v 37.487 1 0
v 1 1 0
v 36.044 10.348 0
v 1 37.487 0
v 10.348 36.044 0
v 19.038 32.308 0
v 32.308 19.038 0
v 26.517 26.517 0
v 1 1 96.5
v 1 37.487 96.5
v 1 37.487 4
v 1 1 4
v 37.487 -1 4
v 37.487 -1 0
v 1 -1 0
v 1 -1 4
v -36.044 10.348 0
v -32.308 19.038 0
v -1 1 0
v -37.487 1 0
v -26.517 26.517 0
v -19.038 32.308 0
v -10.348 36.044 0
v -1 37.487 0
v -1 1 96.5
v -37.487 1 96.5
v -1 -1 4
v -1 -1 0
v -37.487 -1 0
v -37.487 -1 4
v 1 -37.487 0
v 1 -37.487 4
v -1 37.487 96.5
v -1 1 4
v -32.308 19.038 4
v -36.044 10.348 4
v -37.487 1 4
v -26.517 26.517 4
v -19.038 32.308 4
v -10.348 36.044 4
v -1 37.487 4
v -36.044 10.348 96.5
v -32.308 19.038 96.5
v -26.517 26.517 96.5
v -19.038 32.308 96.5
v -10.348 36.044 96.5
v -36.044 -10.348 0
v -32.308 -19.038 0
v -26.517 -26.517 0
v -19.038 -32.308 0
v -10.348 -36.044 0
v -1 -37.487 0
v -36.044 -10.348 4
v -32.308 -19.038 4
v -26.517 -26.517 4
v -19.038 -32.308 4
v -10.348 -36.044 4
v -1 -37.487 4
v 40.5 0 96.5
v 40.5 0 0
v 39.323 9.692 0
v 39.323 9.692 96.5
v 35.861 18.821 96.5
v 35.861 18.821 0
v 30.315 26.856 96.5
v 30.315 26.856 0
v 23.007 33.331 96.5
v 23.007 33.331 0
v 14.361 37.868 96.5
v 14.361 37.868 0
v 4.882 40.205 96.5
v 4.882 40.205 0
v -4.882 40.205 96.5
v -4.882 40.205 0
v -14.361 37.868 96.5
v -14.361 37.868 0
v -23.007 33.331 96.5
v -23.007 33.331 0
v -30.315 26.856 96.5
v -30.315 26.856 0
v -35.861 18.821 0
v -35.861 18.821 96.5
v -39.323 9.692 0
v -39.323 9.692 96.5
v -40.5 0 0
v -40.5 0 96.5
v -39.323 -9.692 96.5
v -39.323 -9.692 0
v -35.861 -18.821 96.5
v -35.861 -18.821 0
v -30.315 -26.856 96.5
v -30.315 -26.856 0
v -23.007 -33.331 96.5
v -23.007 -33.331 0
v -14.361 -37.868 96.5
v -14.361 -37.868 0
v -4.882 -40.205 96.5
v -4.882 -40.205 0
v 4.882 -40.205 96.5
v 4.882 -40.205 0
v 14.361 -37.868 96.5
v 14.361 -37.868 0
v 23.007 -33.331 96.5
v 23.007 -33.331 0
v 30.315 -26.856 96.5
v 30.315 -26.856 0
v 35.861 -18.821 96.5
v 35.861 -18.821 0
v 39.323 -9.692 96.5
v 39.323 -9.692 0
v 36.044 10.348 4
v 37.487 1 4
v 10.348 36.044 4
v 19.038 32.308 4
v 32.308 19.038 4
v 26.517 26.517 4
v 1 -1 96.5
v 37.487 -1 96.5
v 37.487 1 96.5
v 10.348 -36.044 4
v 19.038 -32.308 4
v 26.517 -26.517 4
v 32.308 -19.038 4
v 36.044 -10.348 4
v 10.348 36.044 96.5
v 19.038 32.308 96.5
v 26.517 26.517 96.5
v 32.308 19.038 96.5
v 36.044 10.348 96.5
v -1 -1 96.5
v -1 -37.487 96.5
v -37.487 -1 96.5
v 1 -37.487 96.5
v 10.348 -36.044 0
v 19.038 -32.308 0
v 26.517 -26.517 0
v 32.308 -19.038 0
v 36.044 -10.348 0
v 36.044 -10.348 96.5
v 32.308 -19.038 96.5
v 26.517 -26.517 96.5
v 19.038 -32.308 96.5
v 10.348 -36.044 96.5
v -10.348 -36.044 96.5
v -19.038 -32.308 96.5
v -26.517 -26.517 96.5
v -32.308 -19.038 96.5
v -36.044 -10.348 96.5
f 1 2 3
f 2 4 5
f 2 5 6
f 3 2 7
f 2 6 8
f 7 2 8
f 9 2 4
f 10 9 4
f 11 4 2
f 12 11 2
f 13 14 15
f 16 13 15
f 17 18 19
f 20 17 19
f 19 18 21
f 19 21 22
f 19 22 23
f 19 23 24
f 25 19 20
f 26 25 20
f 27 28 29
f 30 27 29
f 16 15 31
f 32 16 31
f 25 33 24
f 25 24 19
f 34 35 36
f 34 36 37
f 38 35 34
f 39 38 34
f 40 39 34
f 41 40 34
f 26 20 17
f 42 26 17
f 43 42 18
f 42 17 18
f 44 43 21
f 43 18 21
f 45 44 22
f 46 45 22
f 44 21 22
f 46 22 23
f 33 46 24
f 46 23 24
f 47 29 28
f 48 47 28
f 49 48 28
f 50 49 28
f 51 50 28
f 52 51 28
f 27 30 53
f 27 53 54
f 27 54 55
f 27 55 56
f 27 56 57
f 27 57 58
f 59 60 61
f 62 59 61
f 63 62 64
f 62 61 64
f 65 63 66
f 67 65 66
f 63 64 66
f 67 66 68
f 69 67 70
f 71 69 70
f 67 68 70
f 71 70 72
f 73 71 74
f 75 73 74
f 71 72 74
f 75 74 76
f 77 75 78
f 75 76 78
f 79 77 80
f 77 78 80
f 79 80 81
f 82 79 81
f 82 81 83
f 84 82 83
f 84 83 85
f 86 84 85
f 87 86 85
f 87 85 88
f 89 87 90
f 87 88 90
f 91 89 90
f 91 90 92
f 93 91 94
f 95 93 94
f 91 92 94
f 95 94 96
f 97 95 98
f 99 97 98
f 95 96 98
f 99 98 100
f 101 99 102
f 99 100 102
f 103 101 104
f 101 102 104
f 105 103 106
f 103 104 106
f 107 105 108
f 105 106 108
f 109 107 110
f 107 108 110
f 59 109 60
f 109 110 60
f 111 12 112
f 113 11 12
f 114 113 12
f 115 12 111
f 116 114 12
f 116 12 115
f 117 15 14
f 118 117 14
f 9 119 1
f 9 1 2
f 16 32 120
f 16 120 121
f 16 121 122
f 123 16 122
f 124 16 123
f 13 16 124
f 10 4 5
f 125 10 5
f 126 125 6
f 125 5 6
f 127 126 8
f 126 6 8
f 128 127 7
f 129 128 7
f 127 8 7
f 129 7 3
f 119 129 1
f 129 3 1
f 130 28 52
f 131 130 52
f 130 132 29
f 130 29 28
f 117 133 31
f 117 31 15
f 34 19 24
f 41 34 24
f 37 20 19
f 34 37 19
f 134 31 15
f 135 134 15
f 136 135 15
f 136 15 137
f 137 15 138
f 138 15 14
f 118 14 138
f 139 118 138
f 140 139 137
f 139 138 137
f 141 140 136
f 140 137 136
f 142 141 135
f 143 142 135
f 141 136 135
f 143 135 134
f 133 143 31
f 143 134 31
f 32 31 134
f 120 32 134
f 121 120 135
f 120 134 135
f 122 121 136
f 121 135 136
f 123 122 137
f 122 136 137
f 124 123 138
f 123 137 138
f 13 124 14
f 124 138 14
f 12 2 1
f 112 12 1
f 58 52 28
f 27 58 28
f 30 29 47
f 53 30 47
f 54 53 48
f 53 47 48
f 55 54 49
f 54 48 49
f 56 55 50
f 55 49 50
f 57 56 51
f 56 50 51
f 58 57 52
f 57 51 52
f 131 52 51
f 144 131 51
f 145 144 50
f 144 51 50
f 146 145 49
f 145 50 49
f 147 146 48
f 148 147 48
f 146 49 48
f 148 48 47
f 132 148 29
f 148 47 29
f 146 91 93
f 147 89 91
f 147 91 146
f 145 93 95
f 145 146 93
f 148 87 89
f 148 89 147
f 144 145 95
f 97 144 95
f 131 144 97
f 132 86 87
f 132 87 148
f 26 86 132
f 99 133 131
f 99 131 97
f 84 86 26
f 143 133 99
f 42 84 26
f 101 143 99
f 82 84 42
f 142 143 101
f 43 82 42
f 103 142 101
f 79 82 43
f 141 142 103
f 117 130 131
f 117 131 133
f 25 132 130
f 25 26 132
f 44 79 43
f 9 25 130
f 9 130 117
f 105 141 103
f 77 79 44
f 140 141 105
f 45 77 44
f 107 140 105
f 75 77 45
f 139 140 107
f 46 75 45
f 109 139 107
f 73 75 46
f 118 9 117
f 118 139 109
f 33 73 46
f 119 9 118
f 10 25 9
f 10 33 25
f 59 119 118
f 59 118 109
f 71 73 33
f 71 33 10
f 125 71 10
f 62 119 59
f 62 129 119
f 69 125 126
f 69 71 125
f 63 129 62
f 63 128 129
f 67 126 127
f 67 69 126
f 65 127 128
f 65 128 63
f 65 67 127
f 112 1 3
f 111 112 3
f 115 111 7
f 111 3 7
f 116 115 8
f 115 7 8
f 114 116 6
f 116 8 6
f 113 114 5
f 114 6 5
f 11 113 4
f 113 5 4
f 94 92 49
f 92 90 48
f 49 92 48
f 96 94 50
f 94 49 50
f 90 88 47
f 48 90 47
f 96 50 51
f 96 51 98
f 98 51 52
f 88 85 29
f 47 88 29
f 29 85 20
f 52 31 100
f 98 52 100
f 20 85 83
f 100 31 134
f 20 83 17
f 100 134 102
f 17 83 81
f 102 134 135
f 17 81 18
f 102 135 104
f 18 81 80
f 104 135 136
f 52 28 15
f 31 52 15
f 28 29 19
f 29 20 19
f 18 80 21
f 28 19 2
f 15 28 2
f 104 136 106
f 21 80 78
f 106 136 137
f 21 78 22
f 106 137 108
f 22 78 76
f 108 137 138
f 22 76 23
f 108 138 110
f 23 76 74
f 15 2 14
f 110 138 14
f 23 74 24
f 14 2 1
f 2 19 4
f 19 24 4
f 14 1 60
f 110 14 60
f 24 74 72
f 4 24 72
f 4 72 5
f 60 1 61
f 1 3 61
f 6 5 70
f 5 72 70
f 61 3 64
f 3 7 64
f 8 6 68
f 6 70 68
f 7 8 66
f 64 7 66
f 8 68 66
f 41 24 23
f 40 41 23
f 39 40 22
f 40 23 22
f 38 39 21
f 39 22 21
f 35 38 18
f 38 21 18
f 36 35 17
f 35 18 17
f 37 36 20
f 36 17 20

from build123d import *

# Parameters (mm, degrees)
F1_DEPTH = 4
F0_R     = 40.5
F2_DEPTH = 96.5


with BuildPart() as f1:
    # F0 (on Top) → F1 (new body)
    with BuildSketch(Plane.XY):
        with BuildLine():
            Line((-1, -1), (-37.486664, -1))
            ThreePointArc((-37.486664, -1), (-26.516504, -26.516504), (-1, -37.486664))
            Line((-1, -37.486664), (-1, -1))
        make_face()
        with BuildLine():
            ThreePointArc((-1, 37.486664), (-26.516504, 26.516504), (-37.486664, 1))
            Line((-37.486664, 1), (-1, 1))
            Line((-1, 1), (-1, 37.486664))
        make_face()
        with BuildLine():
            ThreePointArc((37.486664, 1), (26.516504, 26.516504), (1, 37.486664))
            Line((1, 37.486664), (1, 1))
            Line((1, 1), (37.486664, 1))
        make_face()
        with BuildLine():
            Line((37.486664, -1), (1, -1))
            Line((1, -1), (1, -37.486664))
            ThreePointArc((1, -37.486664), (26.516504, -26.516504), (37.486664, -1))
        make_face()
    extrude(amount=F1_DEPTH)


with BuildPart() as f2:
    # F0 (on Top) → F2 (new body)
    with BuildSketch(Plane.XY):
        Circle(F0_R)
        with BuildLine():
            ThreePointArc((-1, -37.486664), (-26.516504, -26.516504), (-37.486664, -1))
            Line((-37.486664, -1), (-1, -1))
            Line((-1, -1), (-1, -37.486664))
        make_face(mode=Mode.SUBTRACT)
        with BuildLine():
            Line((1, -37.486664), (1, -1))
            Line((1, -1), (37.486664, -1))
            ThreePointArc((37.486664, -1), (26.516504, -26.516504), (1, -37.486664))
        make_face(mode=Mode.SUBTRACT)
        with BuildLine():
            Line((-1, 1), (-37.486664, 1))
            ThreePointArc((-37.486664, 1), (-26.516504, 26.516504), (-1, 37.486664))
            Line((-1, 37.486664), (-1, 1))
        make_face(mode=Mode.SUBTRACT)
        with BuildLine():
            Line((1, 1), (1, 37.486664))
            ThreePointArc((1, 37.486664), (26.516504, 26.516504), (37.486664, 1))
            Line((37.486664, 1), (1, 1))
        make_face(mode=Mode.SUBTRACT)
    extrude(amount=F2_DEPTH)


solid = Compound([f1.part, f2.part])
